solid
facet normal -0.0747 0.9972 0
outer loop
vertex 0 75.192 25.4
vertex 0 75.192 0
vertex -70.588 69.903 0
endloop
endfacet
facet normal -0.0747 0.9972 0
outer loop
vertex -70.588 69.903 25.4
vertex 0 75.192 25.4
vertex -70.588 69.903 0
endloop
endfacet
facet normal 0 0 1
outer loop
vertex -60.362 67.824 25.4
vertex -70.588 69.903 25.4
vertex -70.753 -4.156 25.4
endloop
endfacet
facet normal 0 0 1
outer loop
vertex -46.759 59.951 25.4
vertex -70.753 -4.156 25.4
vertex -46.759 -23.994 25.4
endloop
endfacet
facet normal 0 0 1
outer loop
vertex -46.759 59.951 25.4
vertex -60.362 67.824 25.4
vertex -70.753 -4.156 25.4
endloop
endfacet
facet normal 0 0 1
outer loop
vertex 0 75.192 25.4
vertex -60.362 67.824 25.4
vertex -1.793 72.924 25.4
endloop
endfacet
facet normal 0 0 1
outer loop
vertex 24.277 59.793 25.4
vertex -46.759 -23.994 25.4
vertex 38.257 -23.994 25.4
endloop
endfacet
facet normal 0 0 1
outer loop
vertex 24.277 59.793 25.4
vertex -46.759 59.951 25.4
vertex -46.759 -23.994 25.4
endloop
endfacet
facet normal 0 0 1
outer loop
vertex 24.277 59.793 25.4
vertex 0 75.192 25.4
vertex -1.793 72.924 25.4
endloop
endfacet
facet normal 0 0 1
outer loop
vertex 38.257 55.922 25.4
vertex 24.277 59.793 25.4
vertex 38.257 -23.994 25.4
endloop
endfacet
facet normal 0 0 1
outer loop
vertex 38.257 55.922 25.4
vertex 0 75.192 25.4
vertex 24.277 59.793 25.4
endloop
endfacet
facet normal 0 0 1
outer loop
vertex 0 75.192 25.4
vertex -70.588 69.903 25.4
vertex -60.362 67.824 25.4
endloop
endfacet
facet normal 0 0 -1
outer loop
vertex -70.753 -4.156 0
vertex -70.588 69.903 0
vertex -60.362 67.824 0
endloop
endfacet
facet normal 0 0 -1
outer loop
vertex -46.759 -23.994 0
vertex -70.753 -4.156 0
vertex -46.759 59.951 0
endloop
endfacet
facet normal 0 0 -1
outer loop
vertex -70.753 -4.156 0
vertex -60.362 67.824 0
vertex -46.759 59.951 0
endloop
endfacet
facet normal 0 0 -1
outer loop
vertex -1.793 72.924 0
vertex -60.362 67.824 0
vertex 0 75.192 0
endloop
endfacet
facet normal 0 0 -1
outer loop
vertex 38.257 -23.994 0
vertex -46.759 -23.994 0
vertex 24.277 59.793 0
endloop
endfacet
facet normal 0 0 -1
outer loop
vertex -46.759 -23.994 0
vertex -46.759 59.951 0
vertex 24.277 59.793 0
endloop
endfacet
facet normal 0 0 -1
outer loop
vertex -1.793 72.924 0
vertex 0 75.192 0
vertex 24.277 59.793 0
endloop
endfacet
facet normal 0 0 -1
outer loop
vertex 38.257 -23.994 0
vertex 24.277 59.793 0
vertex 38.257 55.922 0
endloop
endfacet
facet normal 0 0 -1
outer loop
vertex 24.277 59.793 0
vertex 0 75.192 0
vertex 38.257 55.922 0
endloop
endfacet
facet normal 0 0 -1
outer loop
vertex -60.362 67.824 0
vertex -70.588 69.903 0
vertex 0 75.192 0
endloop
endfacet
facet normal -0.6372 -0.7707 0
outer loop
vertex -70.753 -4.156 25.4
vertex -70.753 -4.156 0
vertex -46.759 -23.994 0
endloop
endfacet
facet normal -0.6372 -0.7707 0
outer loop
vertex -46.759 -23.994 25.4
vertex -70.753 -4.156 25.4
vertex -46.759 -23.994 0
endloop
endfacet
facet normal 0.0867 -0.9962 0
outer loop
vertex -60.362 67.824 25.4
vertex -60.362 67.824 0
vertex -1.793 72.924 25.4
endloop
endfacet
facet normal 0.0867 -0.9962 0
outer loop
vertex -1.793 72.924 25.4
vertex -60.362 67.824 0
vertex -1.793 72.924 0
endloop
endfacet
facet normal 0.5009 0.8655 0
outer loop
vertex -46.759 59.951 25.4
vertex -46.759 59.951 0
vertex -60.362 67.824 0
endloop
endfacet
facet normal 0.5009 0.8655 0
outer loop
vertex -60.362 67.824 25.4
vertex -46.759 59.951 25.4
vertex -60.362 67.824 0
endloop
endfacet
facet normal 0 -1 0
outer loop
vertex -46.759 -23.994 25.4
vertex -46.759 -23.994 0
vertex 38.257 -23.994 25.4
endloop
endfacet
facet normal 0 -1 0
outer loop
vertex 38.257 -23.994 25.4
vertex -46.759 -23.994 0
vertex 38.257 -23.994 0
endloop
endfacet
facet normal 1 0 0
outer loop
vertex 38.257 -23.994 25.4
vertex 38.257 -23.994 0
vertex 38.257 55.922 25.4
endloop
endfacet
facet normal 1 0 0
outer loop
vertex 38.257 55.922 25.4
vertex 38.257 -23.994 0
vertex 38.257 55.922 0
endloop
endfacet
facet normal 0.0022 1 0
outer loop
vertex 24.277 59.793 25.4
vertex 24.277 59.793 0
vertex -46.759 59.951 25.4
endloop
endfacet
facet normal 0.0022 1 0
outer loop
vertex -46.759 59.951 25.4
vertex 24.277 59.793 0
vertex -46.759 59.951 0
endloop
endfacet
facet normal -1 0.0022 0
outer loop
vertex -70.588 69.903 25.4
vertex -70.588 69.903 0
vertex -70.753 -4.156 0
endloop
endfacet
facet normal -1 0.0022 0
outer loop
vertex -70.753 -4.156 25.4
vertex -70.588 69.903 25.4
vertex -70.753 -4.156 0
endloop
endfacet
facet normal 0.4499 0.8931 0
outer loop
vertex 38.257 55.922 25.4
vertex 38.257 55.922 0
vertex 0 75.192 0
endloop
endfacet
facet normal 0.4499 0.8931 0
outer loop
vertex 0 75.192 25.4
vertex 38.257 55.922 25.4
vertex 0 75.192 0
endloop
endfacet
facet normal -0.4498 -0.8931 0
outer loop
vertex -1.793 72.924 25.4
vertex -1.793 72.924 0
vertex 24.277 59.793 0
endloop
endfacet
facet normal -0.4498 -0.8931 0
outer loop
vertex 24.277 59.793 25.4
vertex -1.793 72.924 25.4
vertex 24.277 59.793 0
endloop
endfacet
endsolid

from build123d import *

# Parameters (mm, degrees)
F1_DEPTH = 25.4


with BuildPart() as f1:
    # F0 (on Top) → F1 (new body)
    with BuildSketch(Plane.XY):
        Polygon((-4.628678, 56.017287), (-46.759091, 56.110911), (-46.759091, -23.993554), (38.257439, -23.993554), (38.257439, 55.921983), align=None)
        Polygon((-70.588064, 69.903373), (-46.759091, 56.110911), (-4.628678, 56.017287), (38.257439, 55.921983), (0, 75.192399), align=None)
        Polygon((-46.759091, 59.95094), (-60.361739, 67.824297), (-1.792516, 72.924256), (24.276726, 59.79308), align=None, mode=Mode.SUBTRACT)
        Polygon((-46.759091, -23.993554), (-46.759091, 56.110911), (-70.588064, 69.903373), (-70.752643, -4.156364), align=None)
    extrude(amount=F1_DEPTH)


solid = f1.part
